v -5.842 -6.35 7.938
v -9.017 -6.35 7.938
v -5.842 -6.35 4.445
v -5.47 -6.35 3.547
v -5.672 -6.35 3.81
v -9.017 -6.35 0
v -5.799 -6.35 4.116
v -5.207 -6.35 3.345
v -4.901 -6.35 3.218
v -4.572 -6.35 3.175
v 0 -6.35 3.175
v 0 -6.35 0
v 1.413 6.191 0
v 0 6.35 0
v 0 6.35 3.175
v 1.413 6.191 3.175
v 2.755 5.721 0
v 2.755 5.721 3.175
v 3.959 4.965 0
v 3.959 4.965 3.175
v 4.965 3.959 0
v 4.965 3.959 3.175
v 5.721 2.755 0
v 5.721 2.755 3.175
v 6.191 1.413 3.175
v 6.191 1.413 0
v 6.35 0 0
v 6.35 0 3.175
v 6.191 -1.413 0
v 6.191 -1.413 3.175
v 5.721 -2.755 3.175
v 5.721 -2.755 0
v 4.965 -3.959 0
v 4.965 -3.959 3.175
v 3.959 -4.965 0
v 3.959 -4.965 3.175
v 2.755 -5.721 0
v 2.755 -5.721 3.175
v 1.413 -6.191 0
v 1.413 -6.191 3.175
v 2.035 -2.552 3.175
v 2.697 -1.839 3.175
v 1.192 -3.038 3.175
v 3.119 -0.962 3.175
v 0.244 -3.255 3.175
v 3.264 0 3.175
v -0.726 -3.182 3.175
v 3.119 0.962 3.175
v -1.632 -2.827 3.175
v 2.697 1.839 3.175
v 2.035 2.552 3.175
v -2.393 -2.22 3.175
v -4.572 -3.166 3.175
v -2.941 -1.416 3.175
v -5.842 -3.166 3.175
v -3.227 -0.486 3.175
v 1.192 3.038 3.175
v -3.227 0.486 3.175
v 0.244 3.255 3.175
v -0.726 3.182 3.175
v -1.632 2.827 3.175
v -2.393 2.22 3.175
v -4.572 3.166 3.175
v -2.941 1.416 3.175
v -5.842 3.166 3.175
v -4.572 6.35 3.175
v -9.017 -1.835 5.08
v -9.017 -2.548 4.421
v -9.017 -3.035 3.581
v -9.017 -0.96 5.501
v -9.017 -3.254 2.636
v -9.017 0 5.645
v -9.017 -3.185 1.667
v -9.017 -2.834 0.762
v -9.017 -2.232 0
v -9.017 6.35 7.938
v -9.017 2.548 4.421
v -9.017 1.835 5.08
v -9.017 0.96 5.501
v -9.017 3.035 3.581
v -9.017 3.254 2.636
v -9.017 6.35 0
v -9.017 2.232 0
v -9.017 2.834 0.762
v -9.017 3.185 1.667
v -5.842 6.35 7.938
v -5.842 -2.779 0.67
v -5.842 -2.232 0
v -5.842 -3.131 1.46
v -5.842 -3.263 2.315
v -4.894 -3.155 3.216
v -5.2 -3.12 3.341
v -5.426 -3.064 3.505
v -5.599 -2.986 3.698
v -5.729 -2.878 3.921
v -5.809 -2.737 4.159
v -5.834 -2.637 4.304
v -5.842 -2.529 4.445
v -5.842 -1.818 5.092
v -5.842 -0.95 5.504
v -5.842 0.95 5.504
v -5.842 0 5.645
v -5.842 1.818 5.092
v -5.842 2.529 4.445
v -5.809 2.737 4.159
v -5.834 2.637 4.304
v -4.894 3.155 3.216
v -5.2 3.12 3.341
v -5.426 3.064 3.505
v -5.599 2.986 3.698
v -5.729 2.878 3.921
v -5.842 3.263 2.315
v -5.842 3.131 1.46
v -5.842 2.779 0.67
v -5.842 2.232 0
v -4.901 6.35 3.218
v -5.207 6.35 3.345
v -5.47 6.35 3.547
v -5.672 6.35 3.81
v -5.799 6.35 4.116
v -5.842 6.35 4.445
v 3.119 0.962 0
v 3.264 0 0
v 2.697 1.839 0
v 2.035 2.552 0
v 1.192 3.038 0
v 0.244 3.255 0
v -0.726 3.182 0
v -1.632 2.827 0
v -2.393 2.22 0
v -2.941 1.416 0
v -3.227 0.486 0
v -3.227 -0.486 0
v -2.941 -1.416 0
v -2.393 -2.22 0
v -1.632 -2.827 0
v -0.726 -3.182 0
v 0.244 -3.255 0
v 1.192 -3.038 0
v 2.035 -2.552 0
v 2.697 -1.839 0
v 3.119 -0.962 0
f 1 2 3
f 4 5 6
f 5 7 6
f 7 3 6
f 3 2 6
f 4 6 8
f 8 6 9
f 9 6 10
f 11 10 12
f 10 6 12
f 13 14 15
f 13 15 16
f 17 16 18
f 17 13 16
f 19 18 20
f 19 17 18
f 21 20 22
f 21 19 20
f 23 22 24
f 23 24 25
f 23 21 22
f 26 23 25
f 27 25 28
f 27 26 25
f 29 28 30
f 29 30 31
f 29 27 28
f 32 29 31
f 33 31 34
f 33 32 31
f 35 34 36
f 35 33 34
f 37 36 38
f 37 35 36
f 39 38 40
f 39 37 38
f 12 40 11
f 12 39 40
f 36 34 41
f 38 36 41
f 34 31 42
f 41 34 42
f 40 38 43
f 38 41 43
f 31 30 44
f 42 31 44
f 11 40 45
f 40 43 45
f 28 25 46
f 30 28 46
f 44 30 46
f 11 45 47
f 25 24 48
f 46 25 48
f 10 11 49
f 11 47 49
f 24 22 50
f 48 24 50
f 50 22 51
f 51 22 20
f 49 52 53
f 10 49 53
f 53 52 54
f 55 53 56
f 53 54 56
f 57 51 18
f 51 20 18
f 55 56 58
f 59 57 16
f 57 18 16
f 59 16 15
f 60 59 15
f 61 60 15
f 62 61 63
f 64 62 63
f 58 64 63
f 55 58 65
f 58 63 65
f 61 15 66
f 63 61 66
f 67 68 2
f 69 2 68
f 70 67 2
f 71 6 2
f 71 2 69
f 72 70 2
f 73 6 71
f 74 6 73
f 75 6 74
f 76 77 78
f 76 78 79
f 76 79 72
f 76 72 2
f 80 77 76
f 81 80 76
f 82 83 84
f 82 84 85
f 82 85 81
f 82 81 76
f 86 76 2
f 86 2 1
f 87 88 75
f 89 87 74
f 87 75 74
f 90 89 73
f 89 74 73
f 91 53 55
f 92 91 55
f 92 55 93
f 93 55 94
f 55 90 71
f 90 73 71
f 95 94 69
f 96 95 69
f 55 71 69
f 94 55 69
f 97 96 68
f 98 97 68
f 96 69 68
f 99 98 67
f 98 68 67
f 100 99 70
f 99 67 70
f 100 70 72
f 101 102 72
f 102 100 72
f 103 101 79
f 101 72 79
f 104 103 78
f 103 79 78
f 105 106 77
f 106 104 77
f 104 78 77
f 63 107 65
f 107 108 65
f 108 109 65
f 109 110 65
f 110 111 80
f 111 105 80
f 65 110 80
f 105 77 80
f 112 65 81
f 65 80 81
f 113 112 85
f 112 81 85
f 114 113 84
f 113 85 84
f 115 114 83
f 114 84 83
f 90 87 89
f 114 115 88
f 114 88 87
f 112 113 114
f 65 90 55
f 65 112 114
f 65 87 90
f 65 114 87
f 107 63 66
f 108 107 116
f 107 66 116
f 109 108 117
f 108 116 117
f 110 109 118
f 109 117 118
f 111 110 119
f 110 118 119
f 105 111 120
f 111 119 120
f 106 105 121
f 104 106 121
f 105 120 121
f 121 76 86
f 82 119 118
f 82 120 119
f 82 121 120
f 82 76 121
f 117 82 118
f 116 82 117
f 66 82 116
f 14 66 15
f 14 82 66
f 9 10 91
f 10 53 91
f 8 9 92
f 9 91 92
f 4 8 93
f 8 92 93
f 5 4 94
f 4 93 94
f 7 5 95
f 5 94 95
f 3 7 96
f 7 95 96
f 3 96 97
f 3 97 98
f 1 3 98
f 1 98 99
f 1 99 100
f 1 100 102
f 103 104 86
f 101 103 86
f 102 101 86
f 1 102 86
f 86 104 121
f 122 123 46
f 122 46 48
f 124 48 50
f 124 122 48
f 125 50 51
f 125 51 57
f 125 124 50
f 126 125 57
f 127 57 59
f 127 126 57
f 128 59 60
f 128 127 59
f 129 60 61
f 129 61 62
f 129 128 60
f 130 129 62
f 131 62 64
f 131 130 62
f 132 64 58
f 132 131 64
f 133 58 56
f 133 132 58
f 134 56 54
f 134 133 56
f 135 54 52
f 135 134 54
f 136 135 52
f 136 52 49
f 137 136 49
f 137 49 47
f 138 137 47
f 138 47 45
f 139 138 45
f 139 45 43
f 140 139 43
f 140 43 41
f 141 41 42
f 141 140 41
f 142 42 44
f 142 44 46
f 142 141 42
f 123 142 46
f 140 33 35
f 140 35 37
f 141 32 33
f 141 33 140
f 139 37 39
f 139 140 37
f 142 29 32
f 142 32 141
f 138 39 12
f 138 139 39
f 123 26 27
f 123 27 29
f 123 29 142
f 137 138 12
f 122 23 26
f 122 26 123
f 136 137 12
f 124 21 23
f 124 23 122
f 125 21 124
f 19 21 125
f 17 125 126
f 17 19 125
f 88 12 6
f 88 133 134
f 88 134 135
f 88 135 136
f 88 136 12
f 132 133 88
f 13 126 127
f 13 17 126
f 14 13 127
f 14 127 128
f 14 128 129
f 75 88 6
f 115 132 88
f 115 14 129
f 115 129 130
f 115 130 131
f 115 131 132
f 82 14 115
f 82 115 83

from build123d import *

# Parameters (mm, degrees)
SKETCH1_R           = 3.2639
BOSS_EXTRUDE1_DEPTH = 3.175
SKETCH2_W           = 3.175
SKETCH2_H           = 12.7
BOSS_EXTRUDE2_DEPTH = 4.7625
SKETCH3_R           = 3.2639
CUT_EXTRUDE1_DEPTH  = 3.175
FILLET2_R           = 1.27


with BuildPart() as part:
    # Sketch1 → Boss-Extrude1 (new body)
    with BuildSketch(Plane.XY):
        with BuildLine():
            ThreePointArc((0, 6.35), (6.35, 0), (0, -6.35))
            Line((0, -6.35), (-9.017, -6.35))
            Line((-9.017, -6.35), (-9.017, 6.35))
            Line((-9.017, 6.35), (0, 6.35))
        make_face()
        Circle(SKETCH1_R, mode=Mode.SUBTRACT)
    extrude(amount=BOSS_EXTRUDE1_DEPTH)

    # Sketch2 → Boss-Extrude2 (add)
    with BuildSketch(Plane.XY.offset(3.175)):
        with Locations((-7.4295, 0)):
            Rectangle(SKETCH2_W, SKETCH2_H)
    extrude(amount=BOSS_EXTRUDE2_DEPTH)

    # Sketch3 → Cut-Extrude1 (cut)
    with BuildSketch(Plane.ZY.offset(9.017)):
        with Locations((2.38125, 0)):
            Circle(SKETCH3_R)
    extrude(amount=-CUT_EXTRUDE1_DEPTH, mode=Mode.SUBTRACT)

    # Fillet2
    fillet2_edges = [part.edges().sort_by_distance(p)[0] for p in [
        (-5.842, -4.757956423, 3.175),
        (-5.842, 4.757956423, 3.175),
    ]]
    fillet(fillet2_edges, radius=FILLET2_R)


solid = part.part
